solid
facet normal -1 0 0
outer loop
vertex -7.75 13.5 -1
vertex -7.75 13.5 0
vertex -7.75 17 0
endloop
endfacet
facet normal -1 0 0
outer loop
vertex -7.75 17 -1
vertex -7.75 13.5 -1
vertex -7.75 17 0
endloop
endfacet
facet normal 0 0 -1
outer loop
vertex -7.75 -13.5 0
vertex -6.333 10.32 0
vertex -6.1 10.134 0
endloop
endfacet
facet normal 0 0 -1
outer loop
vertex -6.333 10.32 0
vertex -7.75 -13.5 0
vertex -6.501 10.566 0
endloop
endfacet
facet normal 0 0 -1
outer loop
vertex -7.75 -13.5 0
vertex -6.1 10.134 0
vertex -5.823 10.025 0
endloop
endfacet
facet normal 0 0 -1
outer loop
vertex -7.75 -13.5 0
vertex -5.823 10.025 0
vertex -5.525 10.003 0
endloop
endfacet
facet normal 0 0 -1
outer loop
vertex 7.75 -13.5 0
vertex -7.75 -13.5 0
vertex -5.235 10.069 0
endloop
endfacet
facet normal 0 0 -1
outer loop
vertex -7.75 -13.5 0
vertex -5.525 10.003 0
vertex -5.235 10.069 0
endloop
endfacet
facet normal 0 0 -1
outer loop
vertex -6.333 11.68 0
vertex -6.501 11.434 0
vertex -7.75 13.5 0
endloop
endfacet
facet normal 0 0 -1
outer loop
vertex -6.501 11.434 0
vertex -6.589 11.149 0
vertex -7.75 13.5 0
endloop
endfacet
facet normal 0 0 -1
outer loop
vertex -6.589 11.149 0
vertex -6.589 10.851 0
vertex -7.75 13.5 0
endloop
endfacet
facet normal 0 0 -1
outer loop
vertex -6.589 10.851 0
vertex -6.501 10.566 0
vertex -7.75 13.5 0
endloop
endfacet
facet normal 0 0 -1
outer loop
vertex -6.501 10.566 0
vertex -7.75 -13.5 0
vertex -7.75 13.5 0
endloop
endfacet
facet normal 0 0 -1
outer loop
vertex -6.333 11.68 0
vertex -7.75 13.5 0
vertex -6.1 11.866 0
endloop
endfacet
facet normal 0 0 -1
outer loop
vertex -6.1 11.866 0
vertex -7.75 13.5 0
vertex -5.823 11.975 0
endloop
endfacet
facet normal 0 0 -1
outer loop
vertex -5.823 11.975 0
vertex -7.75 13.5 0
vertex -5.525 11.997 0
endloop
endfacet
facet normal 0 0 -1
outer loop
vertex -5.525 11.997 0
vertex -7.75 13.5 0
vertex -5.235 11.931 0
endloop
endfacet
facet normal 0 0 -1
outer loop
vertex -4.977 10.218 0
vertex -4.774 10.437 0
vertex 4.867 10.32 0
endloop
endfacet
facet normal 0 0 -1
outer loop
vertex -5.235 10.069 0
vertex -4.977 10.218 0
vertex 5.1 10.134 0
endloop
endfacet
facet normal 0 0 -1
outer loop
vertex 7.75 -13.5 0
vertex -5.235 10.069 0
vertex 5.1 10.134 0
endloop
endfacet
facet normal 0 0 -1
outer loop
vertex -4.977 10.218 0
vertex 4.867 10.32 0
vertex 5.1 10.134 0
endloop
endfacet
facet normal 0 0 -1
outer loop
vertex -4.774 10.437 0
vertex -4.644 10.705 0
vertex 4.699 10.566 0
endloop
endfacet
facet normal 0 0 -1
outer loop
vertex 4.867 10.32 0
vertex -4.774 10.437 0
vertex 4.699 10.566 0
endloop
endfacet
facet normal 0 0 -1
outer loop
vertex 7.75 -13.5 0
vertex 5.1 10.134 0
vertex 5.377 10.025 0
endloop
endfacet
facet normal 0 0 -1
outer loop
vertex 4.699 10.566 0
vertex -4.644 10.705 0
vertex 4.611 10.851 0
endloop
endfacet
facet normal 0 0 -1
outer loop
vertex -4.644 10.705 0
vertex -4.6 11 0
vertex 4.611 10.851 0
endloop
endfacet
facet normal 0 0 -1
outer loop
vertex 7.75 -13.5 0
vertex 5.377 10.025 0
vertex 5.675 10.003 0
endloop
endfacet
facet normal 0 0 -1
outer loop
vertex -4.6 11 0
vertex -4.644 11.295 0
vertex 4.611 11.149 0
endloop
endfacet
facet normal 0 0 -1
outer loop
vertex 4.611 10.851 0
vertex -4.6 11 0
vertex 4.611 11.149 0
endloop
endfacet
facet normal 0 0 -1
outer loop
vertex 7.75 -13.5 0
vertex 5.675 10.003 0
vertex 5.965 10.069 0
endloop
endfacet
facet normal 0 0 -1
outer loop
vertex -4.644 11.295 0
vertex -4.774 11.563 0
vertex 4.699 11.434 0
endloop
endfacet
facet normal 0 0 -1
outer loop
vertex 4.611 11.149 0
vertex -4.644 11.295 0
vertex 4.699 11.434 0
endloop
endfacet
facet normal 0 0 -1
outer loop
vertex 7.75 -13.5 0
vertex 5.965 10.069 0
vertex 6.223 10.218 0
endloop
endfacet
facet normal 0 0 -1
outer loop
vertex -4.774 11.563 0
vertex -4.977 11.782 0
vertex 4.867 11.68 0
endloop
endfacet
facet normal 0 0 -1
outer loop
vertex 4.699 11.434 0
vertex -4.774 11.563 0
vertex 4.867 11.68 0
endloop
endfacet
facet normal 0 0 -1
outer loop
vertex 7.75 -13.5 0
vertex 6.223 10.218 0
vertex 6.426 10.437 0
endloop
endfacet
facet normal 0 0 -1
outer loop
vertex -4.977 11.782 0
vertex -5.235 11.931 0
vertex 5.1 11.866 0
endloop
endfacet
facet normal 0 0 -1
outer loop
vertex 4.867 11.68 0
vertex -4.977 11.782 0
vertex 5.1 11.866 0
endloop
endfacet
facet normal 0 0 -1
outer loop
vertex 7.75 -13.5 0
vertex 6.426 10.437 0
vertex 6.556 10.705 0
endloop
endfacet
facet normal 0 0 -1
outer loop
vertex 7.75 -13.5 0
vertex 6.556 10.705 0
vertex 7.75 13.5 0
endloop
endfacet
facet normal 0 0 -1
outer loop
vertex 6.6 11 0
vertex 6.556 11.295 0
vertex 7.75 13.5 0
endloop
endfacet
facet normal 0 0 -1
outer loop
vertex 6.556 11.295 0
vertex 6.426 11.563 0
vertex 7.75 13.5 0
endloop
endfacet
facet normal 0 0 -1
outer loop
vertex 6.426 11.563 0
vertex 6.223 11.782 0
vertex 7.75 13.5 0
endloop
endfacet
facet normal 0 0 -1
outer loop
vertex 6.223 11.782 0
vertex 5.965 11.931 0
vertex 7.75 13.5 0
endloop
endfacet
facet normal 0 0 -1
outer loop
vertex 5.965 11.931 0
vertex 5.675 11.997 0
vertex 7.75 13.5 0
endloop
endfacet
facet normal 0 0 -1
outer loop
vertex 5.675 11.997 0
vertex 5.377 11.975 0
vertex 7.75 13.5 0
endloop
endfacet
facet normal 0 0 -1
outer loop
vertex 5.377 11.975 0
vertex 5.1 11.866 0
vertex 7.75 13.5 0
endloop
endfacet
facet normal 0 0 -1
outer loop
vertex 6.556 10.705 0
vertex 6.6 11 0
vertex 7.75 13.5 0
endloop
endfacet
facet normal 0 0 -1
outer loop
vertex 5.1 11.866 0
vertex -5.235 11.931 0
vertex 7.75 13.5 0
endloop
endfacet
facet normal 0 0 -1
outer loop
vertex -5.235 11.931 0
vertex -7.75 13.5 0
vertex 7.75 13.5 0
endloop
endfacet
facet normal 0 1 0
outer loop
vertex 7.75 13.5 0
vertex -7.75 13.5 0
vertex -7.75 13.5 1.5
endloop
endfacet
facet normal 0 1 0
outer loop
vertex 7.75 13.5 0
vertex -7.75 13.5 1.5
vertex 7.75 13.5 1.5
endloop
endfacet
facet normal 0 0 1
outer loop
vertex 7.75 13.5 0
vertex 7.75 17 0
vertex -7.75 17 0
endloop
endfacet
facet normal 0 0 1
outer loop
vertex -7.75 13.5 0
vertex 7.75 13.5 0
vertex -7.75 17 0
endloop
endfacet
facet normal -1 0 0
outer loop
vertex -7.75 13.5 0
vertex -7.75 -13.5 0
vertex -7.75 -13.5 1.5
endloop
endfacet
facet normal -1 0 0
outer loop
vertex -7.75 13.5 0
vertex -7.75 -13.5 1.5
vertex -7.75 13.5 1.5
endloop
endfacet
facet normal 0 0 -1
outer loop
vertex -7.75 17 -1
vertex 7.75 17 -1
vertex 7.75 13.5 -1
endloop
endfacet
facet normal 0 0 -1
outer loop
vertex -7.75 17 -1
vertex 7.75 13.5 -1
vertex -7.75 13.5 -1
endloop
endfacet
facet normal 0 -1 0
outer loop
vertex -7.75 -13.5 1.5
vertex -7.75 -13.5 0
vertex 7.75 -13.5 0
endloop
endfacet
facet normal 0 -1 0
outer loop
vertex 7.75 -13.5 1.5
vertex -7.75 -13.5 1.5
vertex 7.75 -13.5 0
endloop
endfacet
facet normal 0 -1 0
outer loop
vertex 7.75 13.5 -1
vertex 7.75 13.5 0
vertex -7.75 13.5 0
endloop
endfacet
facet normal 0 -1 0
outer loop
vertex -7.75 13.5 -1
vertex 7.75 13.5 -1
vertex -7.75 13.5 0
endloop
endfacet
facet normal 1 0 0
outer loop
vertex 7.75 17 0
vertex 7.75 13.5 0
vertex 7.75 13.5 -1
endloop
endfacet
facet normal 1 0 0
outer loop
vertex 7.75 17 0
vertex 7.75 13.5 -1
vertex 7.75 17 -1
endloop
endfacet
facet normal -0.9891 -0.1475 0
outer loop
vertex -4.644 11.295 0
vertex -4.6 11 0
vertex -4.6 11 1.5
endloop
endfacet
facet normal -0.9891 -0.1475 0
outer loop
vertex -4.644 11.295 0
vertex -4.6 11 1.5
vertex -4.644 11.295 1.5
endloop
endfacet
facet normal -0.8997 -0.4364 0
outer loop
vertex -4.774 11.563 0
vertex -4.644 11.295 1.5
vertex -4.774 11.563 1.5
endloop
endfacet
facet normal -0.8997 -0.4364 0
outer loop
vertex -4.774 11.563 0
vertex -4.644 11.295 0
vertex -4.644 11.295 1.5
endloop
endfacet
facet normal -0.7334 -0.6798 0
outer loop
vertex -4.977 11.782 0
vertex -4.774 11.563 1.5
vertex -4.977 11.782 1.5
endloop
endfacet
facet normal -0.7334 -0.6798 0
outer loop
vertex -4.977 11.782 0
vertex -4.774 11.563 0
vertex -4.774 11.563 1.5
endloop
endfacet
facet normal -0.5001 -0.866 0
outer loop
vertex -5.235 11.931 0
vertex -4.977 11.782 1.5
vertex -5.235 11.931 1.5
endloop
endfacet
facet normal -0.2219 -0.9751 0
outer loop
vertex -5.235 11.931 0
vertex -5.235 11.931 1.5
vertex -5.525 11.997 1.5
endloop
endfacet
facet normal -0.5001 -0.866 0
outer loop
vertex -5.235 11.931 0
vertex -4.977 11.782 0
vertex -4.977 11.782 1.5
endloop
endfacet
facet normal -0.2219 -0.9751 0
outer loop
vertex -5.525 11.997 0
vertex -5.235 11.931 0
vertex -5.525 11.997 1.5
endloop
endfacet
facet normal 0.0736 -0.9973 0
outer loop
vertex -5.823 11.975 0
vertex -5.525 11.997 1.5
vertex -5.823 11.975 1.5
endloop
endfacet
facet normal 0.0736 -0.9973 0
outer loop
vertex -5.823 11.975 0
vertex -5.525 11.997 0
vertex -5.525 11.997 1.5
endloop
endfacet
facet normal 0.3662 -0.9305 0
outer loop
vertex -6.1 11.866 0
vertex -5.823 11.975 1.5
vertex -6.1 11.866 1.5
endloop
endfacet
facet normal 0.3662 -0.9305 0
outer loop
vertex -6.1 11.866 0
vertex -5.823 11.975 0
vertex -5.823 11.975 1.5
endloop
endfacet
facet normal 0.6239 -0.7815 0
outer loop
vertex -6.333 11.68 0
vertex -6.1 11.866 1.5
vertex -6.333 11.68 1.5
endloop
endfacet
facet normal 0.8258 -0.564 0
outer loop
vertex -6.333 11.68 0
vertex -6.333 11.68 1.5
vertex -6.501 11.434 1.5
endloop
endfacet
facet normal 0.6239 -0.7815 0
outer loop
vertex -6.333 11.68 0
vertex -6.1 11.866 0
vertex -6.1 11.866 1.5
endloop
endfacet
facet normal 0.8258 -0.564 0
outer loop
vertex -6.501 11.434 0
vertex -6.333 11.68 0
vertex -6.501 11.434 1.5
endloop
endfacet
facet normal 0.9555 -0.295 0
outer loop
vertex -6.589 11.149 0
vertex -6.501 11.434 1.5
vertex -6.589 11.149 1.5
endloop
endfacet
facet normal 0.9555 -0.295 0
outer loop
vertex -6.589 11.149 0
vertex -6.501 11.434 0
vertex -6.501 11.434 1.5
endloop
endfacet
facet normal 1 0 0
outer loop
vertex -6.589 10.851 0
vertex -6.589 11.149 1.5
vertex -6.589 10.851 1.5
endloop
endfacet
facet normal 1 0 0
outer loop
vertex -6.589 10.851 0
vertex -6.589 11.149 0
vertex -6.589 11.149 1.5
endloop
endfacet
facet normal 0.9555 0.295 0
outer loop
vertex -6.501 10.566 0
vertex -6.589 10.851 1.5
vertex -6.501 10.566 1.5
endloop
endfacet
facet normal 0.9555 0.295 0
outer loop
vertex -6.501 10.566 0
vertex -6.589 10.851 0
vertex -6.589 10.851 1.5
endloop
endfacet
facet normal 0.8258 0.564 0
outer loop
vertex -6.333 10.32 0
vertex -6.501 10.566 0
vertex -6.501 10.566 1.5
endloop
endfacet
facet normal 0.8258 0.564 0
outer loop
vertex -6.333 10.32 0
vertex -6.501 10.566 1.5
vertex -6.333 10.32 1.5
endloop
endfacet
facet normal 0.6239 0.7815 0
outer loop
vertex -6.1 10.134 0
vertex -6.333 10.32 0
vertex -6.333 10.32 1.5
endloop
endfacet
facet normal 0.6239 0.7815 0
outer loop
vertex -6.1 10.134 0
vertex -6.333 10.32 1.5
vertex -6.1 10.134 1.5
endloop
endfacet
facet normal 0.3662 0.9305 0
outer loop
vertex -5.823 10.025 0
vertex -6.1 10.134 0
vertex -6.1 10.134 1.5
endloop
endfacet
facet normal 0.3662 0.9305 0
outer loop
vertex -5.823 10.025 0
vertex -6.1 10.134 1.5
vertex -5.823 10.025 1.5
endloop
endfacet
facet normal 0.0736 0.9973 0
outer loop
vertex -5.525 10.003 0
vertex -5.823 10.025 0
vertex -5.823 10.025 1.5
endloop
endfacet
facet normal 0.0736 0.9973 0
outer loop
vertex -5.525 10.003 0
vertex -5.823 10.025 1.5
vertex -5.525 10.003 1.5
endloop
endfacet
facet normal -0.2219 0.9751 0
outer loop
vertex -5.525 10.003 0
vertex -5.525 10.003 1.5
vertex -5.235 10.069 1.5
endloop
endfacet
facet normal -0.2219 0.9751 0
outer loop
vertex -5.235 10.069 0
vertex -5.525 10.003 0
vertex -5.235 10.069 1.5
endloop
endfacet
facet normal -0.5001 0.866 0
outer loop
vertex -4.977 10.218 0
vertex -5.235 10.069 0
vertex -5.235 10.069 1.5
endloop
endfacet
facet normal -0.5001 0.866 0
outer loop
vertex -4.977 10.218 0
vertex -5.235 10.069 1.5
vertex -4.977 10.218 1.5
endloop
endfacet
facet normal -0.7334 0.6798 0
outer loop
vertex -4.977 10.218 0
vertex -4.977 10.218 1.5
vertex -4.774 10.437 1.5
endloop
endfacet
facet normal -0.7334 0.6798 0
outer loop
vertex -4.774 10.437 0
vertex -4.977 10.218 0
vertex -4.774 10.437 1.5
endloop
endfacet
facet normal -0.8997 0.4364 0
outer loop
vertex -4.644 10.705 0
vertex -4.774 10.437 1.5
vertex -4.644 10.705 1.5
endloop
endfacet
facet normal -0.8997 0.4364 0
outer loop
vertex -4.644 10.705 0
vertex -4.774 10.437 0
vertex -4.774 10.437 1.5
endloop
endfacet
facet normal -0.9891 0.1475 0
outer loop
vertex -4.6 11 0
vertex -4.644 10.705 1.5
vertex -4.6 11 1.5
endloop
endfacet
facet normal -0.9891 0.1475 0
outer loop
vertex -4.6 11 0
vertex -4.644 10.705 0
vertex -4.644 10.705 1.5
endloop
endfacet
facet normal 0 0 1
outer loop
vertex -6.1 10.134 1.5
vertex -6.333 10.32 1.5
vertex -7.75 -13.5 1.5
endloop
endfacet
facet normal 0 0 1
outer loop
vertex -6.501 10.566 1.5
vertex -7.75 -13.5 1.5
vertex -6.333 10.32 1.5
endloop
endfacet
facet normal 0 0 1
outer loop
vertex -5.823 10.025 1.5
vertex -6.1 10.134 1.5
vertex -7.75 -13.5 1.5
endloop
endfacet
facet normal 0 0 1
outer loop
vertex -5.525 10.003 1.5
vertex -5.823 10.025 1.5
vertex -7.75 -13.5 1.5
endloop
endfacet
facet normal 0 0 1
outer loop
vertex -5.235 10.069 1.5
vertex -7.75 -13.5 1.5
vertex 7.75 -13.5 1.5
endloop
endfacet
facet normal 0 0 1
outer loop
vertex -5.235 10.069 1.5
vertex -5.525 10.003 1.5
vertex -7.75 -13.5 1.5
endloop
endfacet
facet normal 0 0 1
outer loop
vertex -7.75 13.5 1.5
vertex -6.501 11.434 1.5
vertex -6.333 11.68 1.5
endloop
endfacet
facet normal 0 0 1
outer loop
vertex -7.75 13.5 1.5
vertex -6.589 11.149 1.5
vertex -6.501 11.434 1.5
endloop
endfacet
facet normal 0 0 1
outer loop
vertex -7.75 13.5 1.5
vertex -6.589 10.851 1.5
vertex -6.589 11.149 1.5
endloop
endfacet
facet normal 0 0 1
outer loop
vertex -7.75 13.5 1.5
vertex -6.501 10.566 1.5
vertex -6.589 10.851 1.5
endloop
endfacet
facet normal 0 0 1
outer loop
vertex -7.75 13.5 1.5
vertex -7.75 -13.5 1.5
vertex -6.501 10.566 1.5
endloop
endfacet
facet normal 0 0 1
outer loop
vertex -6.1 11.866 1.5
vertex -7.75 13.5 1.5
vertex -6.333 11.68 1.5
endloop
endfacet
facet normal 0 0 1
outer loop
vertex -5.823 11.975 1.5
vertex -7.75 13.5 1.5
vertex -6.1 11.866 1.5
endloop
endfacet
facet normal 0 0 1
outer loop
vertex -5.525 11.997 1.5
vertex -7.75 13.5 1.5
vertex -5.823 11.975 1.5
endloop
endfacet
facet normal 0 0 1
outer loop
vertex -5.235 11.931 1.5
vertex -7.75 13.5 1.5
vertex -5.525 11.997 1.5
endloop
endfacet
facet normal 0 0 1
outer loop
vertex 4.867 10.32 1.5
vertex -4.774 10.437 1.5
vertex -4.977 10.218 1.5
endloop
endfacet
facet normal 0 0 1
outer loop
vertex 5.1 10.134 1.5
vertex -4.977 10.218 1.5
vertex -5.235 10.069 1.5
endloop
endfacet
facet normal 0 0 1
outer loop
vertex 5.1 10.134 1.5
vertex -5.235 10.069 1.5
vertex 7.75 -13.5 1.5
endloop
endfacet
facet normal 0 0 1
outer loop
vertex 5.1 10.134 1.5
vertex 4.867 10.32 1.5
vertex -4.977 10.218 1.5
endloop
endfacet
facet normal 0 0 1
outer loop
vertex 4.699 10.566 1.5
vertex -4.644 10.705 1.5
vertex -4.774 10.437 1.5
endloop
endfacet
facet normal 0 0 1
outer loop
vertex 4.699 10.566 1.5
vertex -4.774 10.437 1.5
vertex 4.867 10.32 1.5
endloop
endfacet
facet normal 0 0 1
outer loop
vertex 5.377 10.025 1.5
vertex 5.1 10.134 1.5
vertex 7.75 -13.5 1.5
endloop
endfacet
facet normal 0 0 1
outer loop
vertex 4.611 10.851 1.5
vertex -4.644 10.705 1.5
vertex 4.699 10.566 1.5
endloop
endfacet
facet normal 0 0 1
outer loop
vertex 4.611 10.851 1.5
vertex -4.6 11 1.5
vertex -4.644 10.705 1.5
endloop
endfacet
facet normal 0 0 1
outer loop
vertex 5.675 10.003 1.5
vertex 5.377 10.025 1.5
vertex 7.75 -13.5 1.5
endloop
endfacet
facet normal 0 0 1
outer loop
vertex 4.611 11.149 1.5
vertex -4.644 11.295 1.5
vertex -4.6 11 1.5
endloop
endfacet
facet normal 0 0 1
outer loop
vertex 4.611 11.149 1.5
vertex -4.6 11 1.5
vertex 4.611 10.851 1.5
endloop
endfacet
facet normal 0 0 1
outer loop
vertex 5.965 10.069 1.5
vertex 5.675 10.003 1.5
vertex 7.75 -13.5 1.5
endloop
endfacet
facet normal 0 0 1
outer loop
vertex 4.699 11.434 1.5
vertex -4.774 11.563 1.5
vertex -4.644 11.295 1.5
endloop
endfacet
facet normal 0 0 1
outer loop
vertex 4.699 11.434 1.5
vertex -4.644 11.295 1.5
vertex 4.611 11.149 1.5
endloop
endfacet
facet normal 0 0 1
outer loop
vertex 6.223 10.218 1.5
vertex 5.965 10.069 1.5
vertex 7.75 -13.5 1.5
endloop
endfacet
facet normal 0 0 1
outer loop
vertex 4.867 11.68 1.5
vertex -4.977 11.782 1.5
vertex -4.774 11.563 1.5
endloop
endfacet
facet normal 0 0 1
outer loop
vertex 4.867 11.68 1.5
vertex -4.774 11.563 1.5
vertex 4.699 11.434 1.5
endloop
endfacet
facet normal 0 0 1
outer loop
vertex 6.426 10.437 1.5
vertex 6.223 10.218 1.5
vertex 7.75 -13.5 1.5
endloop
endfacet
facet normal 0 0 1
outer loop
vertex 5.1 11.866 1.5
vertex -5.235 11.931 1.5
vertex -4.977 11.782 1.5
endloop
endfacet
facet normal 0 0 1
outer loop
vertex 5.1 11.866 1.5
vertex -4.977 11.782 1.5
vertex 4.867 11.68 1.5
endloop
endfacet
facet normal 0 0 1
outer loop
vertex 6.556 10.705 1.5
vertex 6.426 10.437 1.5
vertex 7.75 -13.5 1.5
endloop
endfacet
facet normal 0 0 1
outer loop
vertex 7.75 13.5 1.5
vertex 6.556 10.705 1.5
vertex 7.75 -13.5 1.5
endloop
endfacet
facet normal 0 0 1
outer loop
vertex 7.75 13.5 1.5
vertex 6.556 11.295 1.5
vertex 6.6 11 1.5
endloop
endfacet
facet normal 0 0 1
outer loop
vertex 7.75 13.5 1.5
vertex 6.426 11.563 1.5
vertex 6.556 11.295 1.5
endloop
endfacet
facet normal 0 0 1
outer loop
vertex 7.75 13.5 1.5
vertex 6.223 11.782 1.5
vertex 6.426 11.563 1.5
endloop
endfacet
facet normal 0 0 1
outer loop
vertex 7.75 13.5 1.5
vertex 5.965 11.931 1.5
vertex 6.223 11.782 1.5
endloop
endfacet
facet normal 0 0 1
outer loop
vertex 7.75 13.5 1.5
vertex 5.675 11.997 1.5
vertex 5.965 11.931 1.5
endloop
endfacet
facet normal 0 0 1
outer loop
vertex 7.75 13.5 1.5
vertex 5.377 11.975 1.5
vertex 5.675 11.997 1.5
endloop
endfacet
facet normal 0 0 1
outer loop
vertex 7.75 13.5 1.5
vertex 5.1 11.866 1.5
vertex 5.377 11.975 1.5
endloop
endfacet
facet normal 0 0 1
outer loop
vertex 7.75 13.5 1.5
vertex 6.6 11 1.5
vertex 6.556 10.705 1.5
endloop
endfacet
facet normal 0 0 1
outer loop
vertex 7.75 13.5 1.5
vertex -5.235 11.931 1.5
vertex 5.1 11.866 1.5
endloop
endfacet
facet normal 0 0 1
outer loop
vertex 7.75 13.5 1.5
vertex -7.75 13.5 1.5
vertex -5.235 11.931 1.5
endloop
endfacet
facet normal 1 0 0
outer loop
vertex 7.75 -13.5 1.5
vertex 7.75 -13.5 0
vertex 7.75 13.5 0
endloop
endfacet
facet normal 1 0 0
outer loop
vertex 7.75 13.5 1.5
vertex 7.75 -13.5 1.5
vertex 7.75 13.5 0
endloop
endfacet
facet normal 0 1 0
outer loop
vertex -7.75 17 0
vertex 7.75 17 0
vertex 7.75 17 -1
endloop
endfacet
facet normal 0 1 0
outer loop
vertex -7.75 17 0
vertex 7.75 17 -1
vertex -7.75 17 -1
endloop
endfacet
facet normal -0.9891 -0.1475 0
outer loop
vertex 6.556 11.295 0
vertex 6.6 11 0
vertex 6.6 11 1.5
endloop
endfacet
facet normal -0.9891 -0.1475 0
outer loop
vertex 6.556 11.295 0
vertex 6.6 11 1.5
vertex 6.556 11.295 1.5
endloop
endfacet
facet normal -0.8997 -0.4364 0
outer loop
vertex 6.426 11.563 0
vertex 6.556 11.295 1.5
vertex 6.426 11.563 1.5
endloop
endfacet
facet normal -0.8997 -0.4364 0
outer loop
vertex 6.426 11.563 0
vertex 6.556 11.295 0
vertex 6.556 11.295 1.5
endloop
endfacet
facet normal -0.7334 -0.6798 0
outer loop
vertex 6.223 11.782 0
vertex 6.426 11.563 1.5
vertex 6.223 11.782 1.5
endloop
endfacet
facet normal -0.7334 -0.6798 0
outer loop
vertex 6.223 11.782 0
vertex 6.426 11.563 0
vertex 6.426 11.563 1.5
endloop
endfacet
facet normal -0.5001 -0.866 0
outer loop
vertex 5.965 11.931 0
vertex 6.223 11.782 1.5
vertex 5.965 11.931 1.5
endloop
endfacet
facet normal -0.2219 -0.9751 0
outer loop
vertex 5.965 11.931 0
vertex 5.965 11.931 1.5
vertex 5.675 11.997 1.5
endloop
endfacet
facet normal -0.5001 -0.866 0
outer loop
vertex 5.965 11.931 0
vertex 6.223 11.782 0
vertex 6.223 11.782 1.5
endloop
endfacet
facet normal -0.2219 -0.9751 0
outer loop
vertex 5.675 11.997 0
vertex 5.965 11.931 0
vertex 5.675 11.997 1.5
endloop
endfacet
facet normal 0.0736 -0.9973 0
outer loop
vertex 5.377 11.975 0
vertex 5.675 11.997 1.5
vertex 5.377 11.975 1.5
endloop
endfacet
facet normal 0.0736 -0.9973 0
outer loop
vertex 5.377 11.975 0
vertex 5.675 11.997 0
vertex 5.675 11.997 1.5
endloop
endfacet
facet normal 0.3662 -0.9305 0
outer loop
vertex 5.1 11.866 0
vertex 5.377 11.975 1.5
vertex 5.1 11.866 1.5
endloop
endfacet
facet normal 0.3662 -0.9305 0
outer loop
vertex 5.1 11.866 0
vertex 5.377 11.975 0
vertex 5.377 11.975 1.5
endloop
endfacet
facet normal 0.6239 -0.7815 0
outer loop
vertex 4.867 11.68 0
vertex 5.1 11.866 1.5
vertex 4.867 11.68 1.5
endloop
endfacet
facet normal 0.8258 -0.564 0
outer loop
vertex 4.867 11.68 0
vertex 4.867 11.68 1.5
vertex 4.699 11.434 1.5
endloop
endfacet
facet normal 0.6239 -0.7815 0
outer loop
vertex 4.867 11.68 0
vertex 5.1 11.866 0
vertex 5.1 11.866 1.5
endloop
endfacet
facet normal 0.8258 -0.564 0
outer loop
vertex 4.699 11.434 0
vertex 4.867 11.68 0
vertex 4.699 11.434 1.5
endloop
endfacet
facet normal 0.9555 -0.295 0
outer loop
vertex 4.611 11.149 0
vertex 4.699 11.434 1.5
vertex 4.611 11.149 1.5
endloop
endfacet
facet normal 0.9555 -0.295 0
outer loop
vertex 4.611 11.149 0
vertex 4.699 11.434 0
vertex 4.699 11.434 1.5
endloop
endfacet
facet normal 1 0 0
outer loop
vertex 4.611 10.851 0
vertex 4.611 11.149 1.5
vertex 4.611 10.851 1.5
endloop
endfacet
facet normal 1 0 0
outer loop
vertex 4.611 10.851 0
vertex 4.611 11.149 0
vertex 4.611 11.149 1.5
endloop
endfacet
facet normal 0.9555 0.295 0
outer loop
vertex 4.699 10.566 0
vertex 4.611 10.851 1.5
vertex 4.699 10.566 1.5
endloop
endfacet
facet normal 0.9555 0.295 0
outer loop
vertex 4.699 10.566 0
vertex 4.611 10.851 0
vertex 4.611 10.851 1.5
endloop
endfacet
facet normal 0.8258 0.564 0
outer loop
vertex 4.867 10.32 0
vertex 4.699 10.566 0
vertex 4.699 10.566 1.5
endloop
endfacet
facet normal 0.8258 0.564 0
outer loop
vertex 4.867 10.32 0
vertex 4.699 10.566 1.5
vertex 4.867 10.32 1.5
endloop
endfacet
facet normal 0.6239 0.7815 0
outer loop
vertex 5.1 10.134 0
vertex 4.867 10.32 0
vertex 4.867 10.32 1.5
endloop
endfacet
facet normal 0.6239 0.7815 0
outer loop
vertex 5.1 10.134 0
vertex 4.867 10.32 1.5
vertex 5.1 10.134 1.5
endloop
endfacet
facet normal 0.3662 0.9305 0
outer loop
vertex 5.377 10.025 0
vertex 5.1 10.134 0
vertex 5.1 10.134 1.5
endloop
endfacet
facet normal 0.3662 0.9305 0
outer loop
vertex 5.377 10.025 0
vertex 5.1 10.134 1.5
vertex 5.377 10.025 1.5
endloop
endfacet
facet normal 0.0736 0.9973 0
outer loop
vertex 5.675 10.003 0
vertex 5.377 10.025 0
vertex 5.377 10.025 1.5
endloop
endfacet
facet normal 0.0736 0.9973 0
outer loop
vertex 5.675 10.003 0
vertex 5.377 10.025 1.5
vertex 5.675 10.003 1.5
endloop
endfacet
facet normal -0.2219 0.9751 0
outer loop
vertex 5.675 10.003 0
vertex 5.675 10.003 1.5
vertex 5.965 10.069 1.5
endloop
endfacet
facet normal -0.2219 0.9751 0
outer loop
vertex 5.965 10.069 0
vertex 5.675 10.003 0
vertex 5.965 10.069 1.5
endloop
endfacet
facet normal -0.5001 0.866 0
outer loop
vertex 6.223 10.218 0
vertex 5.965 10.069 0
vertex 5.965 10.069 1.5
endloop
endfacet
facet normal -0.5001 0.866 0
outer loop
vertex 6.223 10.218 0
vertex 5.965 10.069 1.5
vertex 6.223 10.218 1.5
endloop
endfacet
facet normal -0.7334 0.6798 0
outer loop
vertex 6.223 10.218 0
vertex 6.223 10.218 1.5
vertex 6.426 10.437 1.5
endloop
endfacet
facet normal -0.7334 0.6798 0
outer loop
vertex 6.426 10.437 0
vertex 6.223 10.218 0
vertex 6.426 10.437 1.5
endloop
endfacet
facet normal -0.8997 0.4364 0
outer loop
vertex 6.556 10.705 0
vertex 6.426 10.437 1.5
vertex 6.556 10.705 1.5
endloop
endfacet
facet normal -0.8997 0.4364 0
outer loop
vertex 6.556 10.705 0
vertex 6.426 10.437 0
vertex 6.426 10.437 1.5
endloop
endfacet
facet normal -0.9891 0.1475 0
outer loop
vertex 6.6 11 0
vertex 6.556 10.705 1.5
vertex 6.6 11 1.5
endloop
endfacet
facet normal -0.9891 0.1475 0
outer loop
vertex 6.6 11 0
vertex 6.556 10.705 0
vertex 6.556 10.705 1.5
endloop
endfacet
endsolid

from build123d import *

# Parameters (mm, degrees)
SZKIC1_W                    = 15.5
SZKIC1_H                    = 27
SZKIC1_R                    = 1
DODANIE_WYCI_GNI_CIE1_DEPTH = 1.5
SZKIC2_W                    = 15.5
SZKIC2_H                    = 3.5
DODANIE_WYCI_GNI_CIE2_DEPTH = 1


with BuildPart() as part:
    # Szkic1 → Dodanie-wyciągnięcie1 (new body)
    with BuildSketch(Plane.XY):
        Rectangle(SZKIC1_W, SZKIC1_H)
        with Locations((-5.6, 11)):
            Circle(SZKIC1_R, mode=Mode.SUBTRACT)
        with Locations((5.6, 11)):
            Circle(SZKIC1_R, mode=Mode.SUBTRACT)
    extrude(amount=DODANIE_WYCI_GNI_CIE1_DEPTH)


with BuildPart() as body_2:
    # Szkic2 → Dodanie-wyciągnięcie2 (new body)
    with BuildSketch(Plane(origin=(0, 0, 0), x_dir=(-1, 0, 0), z_dir=(0, 0, -1))):
        with Locations((0, 15.25)):
            Rectangle(SZKIC2_W, SZKIC2_H)
    extrude(amount=DODANIE_WYCI_GNI_CIE2_DEPTH)


solid = Compound([part.part, body_2.part])
